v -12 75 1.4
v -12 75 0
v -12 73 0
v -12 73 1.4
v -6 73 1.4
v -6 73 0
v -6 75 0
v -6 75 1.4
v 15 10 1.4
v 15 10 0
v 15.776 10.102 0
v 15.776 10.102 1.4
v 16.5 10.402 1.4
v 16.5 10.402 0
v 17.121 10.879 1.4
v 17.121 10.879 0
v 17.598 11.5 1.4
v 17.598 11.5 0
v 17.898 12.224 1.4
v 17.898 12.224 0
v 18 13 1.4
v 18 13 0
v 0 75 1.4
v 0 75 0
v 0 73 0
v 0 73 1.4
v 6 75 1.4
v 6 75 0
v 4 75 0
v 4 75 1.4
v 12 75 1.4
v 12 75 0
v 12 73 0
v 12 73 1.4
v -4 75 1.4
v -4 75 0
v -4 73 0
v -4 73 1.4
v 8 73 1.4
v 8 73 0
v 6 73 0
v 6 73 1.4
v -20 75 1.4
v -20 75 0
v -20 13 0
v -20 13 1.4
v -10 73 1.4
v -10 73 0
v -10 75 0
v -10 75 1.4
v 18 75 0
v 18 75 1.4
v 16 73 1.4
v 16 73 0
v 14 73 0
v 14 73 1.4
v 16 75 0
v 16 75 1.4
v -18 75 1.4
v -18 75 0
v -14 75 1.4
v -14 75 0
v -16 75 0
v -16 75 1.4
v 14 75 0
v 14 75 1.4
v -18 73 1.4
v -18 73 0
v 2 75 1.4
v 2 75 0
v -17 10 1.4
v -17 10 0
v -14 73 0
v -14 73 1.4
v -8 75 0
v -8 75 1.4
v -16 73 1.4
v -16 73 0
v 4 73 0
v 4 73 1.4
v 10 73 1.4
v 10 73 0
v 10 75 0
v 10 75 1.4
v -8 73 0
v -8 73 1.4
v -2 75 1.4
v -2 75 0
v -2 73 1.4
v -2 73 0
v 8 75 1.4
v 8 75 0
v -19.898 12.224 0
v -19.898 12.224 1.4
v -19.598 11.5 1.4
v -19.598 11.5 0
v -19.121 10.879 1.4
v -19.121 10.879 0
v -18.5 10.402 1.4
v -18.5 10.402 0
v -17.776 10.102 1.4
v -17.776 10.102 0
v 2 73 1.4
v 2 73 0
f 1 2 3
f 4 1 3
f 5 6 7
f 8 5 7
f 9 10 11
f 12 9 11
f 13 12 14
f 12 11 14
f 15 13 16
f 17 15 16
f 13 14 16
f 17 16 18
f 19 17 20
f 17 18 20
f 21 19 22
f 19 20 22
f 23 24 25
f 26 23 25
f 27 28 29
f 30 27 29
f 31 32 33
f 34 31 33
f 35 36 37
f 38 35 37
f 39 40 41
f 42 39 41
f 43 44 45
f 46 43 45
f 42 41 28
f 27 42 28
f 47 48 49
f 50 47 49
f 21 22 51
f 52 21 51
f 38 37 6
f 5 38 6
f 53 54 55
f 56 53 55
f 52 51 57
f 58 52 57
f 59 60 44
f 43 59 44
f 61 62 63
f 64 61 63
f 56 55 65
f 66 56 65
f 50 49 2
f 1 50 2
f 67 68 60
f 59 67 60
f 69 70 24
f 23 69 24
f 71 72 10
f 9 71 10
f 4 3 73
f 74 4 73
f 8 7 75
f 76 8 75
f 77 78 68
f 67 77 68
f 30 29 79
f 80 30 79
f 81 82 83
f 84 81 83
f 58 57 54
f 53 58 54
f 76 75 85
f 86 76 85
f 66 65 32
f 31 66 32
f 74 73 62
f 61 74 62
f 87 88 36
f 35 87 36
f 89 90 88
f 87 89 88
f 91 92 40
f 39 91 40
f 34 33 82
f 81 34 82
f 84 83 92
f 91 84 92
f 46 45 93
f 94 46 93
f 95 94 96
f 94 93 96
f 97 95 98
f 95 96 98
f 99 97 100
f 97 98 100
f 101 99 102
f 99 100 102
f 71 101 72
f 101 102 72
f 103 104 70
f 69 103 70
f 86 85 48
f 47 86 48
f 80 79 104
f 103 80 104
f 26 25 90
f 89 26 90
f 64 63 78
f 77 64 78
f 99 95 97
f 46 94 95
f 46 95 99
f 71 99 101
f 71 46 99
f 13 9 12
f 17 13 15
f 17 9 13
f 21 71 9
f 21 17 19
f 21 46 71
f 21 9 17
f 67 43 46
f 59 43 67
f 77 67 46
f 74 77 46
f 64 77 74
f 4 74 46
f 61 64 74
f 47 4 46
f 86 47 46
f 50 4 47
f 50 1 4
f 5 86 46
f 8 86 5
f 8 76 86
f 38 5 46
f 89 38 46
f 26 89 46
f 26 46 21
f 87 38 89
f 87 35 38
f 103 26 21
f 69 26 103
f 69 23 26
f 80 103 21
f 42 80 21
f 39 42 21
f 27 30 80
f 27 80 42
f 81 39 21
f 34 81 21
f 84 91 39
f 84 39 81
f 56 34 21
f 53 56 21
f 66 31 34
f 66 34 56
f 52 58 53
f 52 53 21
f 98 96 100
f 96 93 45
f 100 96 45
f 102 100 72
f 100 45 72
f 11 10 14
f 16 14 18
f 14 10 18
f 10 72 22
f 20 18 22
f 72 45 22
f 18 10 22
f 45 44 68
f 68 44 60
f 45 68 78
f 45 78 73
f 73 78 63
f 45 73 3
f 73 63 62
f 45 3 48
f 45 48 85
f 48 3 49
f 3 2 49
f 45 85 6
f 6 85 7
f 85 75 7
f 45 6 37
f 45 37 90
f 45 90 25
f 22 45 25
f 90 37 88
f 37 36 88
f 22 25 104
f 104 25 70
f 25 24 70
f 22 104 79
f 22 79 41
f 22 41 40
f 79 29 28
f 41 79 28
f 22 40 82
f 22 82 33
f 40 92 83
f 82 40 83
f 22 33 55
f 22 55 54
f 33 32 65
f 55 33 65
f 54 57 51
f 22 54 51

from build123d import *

# Parameters (mm, degrees)
F1_DEPTH = 1.4


with BuildPart() as f1:
    # F0 (on Top) → F1 (new body)
    with BuildSketch(Plane.XY):
        with BuildLine():
            Line((-18, 75), (-20, 75))
            Line((-20, 75), (-20, 73))
            Line((-20, 73), (-20, 13))
            ThreePointArc((-20, 13), (-19.12132, 10.87868), (-17, 10))
            Line((-17, 10), (-13, 10))
            Line((-13, 10), (13, 10))
            Line((13, 10), (15, 10))
            ThreePointArc((15, 10), (17.12132, 10.87868), (18, 13))
            Line((18, 13), (18, 73))
            Line((18, 73), (18, 75))
            Line((18, 75), (16, 75))
            Line((16, 75), (16, 73))
            Line((16, 73), (14, 73))
            Line((14, 73), (14, 75))
            Line((14, 75), (12, 75))
            Line((12, 75), (12, 73))
            Line((12, 73), (10, 73))
            Line((10, 73), (10, 75))
            Line((10, 75), (8, 75))
            Line((8, 75), (8, 73))
            Line((8, 73), (6, 73))
            Line((6, 73), (6, 75))
            Line((6, 75), (4, 75))
            Line((4, 75), (4, 73))
            Line((4, 73), (2, 73))
            Line((2, 73), (2, 75))
            Line((2, 75), (0, 75))
            Line((0, 75), (0, 73))
            Line((0, 73), (-2, 73))
            Line((-2, 73), (-2, 75))
            Line((-2, 75), (-4, 75))
            Line((-4, 75), (-4, 73))
            Line((-4, 73), (-6, 73))
            Line((-6, 73), (-6, 75))
            Line((-6, 75), (-8, 75))
            Line((-8, 75), (-8, 73))
            Line((-8, 73), (-10, 73))
            Line((-10, 73), (-10, 75))
            Line((-10, 75), (-12, 75))
            Line((-12, 75), (-12, 73))
            Line((-12, 73), (-14, 73))
            Line((-14, 73), (-14, 75))
            Line((-14, 75), (-16, 75))
            Line((-16, 75), (-16, 73))
            Line((-16, 73), (-18, 73))
            Line((-18, 73), (-18, 75))
        make_face()
    extrude(amount=F1_DEPTH)


solid = f1.part
